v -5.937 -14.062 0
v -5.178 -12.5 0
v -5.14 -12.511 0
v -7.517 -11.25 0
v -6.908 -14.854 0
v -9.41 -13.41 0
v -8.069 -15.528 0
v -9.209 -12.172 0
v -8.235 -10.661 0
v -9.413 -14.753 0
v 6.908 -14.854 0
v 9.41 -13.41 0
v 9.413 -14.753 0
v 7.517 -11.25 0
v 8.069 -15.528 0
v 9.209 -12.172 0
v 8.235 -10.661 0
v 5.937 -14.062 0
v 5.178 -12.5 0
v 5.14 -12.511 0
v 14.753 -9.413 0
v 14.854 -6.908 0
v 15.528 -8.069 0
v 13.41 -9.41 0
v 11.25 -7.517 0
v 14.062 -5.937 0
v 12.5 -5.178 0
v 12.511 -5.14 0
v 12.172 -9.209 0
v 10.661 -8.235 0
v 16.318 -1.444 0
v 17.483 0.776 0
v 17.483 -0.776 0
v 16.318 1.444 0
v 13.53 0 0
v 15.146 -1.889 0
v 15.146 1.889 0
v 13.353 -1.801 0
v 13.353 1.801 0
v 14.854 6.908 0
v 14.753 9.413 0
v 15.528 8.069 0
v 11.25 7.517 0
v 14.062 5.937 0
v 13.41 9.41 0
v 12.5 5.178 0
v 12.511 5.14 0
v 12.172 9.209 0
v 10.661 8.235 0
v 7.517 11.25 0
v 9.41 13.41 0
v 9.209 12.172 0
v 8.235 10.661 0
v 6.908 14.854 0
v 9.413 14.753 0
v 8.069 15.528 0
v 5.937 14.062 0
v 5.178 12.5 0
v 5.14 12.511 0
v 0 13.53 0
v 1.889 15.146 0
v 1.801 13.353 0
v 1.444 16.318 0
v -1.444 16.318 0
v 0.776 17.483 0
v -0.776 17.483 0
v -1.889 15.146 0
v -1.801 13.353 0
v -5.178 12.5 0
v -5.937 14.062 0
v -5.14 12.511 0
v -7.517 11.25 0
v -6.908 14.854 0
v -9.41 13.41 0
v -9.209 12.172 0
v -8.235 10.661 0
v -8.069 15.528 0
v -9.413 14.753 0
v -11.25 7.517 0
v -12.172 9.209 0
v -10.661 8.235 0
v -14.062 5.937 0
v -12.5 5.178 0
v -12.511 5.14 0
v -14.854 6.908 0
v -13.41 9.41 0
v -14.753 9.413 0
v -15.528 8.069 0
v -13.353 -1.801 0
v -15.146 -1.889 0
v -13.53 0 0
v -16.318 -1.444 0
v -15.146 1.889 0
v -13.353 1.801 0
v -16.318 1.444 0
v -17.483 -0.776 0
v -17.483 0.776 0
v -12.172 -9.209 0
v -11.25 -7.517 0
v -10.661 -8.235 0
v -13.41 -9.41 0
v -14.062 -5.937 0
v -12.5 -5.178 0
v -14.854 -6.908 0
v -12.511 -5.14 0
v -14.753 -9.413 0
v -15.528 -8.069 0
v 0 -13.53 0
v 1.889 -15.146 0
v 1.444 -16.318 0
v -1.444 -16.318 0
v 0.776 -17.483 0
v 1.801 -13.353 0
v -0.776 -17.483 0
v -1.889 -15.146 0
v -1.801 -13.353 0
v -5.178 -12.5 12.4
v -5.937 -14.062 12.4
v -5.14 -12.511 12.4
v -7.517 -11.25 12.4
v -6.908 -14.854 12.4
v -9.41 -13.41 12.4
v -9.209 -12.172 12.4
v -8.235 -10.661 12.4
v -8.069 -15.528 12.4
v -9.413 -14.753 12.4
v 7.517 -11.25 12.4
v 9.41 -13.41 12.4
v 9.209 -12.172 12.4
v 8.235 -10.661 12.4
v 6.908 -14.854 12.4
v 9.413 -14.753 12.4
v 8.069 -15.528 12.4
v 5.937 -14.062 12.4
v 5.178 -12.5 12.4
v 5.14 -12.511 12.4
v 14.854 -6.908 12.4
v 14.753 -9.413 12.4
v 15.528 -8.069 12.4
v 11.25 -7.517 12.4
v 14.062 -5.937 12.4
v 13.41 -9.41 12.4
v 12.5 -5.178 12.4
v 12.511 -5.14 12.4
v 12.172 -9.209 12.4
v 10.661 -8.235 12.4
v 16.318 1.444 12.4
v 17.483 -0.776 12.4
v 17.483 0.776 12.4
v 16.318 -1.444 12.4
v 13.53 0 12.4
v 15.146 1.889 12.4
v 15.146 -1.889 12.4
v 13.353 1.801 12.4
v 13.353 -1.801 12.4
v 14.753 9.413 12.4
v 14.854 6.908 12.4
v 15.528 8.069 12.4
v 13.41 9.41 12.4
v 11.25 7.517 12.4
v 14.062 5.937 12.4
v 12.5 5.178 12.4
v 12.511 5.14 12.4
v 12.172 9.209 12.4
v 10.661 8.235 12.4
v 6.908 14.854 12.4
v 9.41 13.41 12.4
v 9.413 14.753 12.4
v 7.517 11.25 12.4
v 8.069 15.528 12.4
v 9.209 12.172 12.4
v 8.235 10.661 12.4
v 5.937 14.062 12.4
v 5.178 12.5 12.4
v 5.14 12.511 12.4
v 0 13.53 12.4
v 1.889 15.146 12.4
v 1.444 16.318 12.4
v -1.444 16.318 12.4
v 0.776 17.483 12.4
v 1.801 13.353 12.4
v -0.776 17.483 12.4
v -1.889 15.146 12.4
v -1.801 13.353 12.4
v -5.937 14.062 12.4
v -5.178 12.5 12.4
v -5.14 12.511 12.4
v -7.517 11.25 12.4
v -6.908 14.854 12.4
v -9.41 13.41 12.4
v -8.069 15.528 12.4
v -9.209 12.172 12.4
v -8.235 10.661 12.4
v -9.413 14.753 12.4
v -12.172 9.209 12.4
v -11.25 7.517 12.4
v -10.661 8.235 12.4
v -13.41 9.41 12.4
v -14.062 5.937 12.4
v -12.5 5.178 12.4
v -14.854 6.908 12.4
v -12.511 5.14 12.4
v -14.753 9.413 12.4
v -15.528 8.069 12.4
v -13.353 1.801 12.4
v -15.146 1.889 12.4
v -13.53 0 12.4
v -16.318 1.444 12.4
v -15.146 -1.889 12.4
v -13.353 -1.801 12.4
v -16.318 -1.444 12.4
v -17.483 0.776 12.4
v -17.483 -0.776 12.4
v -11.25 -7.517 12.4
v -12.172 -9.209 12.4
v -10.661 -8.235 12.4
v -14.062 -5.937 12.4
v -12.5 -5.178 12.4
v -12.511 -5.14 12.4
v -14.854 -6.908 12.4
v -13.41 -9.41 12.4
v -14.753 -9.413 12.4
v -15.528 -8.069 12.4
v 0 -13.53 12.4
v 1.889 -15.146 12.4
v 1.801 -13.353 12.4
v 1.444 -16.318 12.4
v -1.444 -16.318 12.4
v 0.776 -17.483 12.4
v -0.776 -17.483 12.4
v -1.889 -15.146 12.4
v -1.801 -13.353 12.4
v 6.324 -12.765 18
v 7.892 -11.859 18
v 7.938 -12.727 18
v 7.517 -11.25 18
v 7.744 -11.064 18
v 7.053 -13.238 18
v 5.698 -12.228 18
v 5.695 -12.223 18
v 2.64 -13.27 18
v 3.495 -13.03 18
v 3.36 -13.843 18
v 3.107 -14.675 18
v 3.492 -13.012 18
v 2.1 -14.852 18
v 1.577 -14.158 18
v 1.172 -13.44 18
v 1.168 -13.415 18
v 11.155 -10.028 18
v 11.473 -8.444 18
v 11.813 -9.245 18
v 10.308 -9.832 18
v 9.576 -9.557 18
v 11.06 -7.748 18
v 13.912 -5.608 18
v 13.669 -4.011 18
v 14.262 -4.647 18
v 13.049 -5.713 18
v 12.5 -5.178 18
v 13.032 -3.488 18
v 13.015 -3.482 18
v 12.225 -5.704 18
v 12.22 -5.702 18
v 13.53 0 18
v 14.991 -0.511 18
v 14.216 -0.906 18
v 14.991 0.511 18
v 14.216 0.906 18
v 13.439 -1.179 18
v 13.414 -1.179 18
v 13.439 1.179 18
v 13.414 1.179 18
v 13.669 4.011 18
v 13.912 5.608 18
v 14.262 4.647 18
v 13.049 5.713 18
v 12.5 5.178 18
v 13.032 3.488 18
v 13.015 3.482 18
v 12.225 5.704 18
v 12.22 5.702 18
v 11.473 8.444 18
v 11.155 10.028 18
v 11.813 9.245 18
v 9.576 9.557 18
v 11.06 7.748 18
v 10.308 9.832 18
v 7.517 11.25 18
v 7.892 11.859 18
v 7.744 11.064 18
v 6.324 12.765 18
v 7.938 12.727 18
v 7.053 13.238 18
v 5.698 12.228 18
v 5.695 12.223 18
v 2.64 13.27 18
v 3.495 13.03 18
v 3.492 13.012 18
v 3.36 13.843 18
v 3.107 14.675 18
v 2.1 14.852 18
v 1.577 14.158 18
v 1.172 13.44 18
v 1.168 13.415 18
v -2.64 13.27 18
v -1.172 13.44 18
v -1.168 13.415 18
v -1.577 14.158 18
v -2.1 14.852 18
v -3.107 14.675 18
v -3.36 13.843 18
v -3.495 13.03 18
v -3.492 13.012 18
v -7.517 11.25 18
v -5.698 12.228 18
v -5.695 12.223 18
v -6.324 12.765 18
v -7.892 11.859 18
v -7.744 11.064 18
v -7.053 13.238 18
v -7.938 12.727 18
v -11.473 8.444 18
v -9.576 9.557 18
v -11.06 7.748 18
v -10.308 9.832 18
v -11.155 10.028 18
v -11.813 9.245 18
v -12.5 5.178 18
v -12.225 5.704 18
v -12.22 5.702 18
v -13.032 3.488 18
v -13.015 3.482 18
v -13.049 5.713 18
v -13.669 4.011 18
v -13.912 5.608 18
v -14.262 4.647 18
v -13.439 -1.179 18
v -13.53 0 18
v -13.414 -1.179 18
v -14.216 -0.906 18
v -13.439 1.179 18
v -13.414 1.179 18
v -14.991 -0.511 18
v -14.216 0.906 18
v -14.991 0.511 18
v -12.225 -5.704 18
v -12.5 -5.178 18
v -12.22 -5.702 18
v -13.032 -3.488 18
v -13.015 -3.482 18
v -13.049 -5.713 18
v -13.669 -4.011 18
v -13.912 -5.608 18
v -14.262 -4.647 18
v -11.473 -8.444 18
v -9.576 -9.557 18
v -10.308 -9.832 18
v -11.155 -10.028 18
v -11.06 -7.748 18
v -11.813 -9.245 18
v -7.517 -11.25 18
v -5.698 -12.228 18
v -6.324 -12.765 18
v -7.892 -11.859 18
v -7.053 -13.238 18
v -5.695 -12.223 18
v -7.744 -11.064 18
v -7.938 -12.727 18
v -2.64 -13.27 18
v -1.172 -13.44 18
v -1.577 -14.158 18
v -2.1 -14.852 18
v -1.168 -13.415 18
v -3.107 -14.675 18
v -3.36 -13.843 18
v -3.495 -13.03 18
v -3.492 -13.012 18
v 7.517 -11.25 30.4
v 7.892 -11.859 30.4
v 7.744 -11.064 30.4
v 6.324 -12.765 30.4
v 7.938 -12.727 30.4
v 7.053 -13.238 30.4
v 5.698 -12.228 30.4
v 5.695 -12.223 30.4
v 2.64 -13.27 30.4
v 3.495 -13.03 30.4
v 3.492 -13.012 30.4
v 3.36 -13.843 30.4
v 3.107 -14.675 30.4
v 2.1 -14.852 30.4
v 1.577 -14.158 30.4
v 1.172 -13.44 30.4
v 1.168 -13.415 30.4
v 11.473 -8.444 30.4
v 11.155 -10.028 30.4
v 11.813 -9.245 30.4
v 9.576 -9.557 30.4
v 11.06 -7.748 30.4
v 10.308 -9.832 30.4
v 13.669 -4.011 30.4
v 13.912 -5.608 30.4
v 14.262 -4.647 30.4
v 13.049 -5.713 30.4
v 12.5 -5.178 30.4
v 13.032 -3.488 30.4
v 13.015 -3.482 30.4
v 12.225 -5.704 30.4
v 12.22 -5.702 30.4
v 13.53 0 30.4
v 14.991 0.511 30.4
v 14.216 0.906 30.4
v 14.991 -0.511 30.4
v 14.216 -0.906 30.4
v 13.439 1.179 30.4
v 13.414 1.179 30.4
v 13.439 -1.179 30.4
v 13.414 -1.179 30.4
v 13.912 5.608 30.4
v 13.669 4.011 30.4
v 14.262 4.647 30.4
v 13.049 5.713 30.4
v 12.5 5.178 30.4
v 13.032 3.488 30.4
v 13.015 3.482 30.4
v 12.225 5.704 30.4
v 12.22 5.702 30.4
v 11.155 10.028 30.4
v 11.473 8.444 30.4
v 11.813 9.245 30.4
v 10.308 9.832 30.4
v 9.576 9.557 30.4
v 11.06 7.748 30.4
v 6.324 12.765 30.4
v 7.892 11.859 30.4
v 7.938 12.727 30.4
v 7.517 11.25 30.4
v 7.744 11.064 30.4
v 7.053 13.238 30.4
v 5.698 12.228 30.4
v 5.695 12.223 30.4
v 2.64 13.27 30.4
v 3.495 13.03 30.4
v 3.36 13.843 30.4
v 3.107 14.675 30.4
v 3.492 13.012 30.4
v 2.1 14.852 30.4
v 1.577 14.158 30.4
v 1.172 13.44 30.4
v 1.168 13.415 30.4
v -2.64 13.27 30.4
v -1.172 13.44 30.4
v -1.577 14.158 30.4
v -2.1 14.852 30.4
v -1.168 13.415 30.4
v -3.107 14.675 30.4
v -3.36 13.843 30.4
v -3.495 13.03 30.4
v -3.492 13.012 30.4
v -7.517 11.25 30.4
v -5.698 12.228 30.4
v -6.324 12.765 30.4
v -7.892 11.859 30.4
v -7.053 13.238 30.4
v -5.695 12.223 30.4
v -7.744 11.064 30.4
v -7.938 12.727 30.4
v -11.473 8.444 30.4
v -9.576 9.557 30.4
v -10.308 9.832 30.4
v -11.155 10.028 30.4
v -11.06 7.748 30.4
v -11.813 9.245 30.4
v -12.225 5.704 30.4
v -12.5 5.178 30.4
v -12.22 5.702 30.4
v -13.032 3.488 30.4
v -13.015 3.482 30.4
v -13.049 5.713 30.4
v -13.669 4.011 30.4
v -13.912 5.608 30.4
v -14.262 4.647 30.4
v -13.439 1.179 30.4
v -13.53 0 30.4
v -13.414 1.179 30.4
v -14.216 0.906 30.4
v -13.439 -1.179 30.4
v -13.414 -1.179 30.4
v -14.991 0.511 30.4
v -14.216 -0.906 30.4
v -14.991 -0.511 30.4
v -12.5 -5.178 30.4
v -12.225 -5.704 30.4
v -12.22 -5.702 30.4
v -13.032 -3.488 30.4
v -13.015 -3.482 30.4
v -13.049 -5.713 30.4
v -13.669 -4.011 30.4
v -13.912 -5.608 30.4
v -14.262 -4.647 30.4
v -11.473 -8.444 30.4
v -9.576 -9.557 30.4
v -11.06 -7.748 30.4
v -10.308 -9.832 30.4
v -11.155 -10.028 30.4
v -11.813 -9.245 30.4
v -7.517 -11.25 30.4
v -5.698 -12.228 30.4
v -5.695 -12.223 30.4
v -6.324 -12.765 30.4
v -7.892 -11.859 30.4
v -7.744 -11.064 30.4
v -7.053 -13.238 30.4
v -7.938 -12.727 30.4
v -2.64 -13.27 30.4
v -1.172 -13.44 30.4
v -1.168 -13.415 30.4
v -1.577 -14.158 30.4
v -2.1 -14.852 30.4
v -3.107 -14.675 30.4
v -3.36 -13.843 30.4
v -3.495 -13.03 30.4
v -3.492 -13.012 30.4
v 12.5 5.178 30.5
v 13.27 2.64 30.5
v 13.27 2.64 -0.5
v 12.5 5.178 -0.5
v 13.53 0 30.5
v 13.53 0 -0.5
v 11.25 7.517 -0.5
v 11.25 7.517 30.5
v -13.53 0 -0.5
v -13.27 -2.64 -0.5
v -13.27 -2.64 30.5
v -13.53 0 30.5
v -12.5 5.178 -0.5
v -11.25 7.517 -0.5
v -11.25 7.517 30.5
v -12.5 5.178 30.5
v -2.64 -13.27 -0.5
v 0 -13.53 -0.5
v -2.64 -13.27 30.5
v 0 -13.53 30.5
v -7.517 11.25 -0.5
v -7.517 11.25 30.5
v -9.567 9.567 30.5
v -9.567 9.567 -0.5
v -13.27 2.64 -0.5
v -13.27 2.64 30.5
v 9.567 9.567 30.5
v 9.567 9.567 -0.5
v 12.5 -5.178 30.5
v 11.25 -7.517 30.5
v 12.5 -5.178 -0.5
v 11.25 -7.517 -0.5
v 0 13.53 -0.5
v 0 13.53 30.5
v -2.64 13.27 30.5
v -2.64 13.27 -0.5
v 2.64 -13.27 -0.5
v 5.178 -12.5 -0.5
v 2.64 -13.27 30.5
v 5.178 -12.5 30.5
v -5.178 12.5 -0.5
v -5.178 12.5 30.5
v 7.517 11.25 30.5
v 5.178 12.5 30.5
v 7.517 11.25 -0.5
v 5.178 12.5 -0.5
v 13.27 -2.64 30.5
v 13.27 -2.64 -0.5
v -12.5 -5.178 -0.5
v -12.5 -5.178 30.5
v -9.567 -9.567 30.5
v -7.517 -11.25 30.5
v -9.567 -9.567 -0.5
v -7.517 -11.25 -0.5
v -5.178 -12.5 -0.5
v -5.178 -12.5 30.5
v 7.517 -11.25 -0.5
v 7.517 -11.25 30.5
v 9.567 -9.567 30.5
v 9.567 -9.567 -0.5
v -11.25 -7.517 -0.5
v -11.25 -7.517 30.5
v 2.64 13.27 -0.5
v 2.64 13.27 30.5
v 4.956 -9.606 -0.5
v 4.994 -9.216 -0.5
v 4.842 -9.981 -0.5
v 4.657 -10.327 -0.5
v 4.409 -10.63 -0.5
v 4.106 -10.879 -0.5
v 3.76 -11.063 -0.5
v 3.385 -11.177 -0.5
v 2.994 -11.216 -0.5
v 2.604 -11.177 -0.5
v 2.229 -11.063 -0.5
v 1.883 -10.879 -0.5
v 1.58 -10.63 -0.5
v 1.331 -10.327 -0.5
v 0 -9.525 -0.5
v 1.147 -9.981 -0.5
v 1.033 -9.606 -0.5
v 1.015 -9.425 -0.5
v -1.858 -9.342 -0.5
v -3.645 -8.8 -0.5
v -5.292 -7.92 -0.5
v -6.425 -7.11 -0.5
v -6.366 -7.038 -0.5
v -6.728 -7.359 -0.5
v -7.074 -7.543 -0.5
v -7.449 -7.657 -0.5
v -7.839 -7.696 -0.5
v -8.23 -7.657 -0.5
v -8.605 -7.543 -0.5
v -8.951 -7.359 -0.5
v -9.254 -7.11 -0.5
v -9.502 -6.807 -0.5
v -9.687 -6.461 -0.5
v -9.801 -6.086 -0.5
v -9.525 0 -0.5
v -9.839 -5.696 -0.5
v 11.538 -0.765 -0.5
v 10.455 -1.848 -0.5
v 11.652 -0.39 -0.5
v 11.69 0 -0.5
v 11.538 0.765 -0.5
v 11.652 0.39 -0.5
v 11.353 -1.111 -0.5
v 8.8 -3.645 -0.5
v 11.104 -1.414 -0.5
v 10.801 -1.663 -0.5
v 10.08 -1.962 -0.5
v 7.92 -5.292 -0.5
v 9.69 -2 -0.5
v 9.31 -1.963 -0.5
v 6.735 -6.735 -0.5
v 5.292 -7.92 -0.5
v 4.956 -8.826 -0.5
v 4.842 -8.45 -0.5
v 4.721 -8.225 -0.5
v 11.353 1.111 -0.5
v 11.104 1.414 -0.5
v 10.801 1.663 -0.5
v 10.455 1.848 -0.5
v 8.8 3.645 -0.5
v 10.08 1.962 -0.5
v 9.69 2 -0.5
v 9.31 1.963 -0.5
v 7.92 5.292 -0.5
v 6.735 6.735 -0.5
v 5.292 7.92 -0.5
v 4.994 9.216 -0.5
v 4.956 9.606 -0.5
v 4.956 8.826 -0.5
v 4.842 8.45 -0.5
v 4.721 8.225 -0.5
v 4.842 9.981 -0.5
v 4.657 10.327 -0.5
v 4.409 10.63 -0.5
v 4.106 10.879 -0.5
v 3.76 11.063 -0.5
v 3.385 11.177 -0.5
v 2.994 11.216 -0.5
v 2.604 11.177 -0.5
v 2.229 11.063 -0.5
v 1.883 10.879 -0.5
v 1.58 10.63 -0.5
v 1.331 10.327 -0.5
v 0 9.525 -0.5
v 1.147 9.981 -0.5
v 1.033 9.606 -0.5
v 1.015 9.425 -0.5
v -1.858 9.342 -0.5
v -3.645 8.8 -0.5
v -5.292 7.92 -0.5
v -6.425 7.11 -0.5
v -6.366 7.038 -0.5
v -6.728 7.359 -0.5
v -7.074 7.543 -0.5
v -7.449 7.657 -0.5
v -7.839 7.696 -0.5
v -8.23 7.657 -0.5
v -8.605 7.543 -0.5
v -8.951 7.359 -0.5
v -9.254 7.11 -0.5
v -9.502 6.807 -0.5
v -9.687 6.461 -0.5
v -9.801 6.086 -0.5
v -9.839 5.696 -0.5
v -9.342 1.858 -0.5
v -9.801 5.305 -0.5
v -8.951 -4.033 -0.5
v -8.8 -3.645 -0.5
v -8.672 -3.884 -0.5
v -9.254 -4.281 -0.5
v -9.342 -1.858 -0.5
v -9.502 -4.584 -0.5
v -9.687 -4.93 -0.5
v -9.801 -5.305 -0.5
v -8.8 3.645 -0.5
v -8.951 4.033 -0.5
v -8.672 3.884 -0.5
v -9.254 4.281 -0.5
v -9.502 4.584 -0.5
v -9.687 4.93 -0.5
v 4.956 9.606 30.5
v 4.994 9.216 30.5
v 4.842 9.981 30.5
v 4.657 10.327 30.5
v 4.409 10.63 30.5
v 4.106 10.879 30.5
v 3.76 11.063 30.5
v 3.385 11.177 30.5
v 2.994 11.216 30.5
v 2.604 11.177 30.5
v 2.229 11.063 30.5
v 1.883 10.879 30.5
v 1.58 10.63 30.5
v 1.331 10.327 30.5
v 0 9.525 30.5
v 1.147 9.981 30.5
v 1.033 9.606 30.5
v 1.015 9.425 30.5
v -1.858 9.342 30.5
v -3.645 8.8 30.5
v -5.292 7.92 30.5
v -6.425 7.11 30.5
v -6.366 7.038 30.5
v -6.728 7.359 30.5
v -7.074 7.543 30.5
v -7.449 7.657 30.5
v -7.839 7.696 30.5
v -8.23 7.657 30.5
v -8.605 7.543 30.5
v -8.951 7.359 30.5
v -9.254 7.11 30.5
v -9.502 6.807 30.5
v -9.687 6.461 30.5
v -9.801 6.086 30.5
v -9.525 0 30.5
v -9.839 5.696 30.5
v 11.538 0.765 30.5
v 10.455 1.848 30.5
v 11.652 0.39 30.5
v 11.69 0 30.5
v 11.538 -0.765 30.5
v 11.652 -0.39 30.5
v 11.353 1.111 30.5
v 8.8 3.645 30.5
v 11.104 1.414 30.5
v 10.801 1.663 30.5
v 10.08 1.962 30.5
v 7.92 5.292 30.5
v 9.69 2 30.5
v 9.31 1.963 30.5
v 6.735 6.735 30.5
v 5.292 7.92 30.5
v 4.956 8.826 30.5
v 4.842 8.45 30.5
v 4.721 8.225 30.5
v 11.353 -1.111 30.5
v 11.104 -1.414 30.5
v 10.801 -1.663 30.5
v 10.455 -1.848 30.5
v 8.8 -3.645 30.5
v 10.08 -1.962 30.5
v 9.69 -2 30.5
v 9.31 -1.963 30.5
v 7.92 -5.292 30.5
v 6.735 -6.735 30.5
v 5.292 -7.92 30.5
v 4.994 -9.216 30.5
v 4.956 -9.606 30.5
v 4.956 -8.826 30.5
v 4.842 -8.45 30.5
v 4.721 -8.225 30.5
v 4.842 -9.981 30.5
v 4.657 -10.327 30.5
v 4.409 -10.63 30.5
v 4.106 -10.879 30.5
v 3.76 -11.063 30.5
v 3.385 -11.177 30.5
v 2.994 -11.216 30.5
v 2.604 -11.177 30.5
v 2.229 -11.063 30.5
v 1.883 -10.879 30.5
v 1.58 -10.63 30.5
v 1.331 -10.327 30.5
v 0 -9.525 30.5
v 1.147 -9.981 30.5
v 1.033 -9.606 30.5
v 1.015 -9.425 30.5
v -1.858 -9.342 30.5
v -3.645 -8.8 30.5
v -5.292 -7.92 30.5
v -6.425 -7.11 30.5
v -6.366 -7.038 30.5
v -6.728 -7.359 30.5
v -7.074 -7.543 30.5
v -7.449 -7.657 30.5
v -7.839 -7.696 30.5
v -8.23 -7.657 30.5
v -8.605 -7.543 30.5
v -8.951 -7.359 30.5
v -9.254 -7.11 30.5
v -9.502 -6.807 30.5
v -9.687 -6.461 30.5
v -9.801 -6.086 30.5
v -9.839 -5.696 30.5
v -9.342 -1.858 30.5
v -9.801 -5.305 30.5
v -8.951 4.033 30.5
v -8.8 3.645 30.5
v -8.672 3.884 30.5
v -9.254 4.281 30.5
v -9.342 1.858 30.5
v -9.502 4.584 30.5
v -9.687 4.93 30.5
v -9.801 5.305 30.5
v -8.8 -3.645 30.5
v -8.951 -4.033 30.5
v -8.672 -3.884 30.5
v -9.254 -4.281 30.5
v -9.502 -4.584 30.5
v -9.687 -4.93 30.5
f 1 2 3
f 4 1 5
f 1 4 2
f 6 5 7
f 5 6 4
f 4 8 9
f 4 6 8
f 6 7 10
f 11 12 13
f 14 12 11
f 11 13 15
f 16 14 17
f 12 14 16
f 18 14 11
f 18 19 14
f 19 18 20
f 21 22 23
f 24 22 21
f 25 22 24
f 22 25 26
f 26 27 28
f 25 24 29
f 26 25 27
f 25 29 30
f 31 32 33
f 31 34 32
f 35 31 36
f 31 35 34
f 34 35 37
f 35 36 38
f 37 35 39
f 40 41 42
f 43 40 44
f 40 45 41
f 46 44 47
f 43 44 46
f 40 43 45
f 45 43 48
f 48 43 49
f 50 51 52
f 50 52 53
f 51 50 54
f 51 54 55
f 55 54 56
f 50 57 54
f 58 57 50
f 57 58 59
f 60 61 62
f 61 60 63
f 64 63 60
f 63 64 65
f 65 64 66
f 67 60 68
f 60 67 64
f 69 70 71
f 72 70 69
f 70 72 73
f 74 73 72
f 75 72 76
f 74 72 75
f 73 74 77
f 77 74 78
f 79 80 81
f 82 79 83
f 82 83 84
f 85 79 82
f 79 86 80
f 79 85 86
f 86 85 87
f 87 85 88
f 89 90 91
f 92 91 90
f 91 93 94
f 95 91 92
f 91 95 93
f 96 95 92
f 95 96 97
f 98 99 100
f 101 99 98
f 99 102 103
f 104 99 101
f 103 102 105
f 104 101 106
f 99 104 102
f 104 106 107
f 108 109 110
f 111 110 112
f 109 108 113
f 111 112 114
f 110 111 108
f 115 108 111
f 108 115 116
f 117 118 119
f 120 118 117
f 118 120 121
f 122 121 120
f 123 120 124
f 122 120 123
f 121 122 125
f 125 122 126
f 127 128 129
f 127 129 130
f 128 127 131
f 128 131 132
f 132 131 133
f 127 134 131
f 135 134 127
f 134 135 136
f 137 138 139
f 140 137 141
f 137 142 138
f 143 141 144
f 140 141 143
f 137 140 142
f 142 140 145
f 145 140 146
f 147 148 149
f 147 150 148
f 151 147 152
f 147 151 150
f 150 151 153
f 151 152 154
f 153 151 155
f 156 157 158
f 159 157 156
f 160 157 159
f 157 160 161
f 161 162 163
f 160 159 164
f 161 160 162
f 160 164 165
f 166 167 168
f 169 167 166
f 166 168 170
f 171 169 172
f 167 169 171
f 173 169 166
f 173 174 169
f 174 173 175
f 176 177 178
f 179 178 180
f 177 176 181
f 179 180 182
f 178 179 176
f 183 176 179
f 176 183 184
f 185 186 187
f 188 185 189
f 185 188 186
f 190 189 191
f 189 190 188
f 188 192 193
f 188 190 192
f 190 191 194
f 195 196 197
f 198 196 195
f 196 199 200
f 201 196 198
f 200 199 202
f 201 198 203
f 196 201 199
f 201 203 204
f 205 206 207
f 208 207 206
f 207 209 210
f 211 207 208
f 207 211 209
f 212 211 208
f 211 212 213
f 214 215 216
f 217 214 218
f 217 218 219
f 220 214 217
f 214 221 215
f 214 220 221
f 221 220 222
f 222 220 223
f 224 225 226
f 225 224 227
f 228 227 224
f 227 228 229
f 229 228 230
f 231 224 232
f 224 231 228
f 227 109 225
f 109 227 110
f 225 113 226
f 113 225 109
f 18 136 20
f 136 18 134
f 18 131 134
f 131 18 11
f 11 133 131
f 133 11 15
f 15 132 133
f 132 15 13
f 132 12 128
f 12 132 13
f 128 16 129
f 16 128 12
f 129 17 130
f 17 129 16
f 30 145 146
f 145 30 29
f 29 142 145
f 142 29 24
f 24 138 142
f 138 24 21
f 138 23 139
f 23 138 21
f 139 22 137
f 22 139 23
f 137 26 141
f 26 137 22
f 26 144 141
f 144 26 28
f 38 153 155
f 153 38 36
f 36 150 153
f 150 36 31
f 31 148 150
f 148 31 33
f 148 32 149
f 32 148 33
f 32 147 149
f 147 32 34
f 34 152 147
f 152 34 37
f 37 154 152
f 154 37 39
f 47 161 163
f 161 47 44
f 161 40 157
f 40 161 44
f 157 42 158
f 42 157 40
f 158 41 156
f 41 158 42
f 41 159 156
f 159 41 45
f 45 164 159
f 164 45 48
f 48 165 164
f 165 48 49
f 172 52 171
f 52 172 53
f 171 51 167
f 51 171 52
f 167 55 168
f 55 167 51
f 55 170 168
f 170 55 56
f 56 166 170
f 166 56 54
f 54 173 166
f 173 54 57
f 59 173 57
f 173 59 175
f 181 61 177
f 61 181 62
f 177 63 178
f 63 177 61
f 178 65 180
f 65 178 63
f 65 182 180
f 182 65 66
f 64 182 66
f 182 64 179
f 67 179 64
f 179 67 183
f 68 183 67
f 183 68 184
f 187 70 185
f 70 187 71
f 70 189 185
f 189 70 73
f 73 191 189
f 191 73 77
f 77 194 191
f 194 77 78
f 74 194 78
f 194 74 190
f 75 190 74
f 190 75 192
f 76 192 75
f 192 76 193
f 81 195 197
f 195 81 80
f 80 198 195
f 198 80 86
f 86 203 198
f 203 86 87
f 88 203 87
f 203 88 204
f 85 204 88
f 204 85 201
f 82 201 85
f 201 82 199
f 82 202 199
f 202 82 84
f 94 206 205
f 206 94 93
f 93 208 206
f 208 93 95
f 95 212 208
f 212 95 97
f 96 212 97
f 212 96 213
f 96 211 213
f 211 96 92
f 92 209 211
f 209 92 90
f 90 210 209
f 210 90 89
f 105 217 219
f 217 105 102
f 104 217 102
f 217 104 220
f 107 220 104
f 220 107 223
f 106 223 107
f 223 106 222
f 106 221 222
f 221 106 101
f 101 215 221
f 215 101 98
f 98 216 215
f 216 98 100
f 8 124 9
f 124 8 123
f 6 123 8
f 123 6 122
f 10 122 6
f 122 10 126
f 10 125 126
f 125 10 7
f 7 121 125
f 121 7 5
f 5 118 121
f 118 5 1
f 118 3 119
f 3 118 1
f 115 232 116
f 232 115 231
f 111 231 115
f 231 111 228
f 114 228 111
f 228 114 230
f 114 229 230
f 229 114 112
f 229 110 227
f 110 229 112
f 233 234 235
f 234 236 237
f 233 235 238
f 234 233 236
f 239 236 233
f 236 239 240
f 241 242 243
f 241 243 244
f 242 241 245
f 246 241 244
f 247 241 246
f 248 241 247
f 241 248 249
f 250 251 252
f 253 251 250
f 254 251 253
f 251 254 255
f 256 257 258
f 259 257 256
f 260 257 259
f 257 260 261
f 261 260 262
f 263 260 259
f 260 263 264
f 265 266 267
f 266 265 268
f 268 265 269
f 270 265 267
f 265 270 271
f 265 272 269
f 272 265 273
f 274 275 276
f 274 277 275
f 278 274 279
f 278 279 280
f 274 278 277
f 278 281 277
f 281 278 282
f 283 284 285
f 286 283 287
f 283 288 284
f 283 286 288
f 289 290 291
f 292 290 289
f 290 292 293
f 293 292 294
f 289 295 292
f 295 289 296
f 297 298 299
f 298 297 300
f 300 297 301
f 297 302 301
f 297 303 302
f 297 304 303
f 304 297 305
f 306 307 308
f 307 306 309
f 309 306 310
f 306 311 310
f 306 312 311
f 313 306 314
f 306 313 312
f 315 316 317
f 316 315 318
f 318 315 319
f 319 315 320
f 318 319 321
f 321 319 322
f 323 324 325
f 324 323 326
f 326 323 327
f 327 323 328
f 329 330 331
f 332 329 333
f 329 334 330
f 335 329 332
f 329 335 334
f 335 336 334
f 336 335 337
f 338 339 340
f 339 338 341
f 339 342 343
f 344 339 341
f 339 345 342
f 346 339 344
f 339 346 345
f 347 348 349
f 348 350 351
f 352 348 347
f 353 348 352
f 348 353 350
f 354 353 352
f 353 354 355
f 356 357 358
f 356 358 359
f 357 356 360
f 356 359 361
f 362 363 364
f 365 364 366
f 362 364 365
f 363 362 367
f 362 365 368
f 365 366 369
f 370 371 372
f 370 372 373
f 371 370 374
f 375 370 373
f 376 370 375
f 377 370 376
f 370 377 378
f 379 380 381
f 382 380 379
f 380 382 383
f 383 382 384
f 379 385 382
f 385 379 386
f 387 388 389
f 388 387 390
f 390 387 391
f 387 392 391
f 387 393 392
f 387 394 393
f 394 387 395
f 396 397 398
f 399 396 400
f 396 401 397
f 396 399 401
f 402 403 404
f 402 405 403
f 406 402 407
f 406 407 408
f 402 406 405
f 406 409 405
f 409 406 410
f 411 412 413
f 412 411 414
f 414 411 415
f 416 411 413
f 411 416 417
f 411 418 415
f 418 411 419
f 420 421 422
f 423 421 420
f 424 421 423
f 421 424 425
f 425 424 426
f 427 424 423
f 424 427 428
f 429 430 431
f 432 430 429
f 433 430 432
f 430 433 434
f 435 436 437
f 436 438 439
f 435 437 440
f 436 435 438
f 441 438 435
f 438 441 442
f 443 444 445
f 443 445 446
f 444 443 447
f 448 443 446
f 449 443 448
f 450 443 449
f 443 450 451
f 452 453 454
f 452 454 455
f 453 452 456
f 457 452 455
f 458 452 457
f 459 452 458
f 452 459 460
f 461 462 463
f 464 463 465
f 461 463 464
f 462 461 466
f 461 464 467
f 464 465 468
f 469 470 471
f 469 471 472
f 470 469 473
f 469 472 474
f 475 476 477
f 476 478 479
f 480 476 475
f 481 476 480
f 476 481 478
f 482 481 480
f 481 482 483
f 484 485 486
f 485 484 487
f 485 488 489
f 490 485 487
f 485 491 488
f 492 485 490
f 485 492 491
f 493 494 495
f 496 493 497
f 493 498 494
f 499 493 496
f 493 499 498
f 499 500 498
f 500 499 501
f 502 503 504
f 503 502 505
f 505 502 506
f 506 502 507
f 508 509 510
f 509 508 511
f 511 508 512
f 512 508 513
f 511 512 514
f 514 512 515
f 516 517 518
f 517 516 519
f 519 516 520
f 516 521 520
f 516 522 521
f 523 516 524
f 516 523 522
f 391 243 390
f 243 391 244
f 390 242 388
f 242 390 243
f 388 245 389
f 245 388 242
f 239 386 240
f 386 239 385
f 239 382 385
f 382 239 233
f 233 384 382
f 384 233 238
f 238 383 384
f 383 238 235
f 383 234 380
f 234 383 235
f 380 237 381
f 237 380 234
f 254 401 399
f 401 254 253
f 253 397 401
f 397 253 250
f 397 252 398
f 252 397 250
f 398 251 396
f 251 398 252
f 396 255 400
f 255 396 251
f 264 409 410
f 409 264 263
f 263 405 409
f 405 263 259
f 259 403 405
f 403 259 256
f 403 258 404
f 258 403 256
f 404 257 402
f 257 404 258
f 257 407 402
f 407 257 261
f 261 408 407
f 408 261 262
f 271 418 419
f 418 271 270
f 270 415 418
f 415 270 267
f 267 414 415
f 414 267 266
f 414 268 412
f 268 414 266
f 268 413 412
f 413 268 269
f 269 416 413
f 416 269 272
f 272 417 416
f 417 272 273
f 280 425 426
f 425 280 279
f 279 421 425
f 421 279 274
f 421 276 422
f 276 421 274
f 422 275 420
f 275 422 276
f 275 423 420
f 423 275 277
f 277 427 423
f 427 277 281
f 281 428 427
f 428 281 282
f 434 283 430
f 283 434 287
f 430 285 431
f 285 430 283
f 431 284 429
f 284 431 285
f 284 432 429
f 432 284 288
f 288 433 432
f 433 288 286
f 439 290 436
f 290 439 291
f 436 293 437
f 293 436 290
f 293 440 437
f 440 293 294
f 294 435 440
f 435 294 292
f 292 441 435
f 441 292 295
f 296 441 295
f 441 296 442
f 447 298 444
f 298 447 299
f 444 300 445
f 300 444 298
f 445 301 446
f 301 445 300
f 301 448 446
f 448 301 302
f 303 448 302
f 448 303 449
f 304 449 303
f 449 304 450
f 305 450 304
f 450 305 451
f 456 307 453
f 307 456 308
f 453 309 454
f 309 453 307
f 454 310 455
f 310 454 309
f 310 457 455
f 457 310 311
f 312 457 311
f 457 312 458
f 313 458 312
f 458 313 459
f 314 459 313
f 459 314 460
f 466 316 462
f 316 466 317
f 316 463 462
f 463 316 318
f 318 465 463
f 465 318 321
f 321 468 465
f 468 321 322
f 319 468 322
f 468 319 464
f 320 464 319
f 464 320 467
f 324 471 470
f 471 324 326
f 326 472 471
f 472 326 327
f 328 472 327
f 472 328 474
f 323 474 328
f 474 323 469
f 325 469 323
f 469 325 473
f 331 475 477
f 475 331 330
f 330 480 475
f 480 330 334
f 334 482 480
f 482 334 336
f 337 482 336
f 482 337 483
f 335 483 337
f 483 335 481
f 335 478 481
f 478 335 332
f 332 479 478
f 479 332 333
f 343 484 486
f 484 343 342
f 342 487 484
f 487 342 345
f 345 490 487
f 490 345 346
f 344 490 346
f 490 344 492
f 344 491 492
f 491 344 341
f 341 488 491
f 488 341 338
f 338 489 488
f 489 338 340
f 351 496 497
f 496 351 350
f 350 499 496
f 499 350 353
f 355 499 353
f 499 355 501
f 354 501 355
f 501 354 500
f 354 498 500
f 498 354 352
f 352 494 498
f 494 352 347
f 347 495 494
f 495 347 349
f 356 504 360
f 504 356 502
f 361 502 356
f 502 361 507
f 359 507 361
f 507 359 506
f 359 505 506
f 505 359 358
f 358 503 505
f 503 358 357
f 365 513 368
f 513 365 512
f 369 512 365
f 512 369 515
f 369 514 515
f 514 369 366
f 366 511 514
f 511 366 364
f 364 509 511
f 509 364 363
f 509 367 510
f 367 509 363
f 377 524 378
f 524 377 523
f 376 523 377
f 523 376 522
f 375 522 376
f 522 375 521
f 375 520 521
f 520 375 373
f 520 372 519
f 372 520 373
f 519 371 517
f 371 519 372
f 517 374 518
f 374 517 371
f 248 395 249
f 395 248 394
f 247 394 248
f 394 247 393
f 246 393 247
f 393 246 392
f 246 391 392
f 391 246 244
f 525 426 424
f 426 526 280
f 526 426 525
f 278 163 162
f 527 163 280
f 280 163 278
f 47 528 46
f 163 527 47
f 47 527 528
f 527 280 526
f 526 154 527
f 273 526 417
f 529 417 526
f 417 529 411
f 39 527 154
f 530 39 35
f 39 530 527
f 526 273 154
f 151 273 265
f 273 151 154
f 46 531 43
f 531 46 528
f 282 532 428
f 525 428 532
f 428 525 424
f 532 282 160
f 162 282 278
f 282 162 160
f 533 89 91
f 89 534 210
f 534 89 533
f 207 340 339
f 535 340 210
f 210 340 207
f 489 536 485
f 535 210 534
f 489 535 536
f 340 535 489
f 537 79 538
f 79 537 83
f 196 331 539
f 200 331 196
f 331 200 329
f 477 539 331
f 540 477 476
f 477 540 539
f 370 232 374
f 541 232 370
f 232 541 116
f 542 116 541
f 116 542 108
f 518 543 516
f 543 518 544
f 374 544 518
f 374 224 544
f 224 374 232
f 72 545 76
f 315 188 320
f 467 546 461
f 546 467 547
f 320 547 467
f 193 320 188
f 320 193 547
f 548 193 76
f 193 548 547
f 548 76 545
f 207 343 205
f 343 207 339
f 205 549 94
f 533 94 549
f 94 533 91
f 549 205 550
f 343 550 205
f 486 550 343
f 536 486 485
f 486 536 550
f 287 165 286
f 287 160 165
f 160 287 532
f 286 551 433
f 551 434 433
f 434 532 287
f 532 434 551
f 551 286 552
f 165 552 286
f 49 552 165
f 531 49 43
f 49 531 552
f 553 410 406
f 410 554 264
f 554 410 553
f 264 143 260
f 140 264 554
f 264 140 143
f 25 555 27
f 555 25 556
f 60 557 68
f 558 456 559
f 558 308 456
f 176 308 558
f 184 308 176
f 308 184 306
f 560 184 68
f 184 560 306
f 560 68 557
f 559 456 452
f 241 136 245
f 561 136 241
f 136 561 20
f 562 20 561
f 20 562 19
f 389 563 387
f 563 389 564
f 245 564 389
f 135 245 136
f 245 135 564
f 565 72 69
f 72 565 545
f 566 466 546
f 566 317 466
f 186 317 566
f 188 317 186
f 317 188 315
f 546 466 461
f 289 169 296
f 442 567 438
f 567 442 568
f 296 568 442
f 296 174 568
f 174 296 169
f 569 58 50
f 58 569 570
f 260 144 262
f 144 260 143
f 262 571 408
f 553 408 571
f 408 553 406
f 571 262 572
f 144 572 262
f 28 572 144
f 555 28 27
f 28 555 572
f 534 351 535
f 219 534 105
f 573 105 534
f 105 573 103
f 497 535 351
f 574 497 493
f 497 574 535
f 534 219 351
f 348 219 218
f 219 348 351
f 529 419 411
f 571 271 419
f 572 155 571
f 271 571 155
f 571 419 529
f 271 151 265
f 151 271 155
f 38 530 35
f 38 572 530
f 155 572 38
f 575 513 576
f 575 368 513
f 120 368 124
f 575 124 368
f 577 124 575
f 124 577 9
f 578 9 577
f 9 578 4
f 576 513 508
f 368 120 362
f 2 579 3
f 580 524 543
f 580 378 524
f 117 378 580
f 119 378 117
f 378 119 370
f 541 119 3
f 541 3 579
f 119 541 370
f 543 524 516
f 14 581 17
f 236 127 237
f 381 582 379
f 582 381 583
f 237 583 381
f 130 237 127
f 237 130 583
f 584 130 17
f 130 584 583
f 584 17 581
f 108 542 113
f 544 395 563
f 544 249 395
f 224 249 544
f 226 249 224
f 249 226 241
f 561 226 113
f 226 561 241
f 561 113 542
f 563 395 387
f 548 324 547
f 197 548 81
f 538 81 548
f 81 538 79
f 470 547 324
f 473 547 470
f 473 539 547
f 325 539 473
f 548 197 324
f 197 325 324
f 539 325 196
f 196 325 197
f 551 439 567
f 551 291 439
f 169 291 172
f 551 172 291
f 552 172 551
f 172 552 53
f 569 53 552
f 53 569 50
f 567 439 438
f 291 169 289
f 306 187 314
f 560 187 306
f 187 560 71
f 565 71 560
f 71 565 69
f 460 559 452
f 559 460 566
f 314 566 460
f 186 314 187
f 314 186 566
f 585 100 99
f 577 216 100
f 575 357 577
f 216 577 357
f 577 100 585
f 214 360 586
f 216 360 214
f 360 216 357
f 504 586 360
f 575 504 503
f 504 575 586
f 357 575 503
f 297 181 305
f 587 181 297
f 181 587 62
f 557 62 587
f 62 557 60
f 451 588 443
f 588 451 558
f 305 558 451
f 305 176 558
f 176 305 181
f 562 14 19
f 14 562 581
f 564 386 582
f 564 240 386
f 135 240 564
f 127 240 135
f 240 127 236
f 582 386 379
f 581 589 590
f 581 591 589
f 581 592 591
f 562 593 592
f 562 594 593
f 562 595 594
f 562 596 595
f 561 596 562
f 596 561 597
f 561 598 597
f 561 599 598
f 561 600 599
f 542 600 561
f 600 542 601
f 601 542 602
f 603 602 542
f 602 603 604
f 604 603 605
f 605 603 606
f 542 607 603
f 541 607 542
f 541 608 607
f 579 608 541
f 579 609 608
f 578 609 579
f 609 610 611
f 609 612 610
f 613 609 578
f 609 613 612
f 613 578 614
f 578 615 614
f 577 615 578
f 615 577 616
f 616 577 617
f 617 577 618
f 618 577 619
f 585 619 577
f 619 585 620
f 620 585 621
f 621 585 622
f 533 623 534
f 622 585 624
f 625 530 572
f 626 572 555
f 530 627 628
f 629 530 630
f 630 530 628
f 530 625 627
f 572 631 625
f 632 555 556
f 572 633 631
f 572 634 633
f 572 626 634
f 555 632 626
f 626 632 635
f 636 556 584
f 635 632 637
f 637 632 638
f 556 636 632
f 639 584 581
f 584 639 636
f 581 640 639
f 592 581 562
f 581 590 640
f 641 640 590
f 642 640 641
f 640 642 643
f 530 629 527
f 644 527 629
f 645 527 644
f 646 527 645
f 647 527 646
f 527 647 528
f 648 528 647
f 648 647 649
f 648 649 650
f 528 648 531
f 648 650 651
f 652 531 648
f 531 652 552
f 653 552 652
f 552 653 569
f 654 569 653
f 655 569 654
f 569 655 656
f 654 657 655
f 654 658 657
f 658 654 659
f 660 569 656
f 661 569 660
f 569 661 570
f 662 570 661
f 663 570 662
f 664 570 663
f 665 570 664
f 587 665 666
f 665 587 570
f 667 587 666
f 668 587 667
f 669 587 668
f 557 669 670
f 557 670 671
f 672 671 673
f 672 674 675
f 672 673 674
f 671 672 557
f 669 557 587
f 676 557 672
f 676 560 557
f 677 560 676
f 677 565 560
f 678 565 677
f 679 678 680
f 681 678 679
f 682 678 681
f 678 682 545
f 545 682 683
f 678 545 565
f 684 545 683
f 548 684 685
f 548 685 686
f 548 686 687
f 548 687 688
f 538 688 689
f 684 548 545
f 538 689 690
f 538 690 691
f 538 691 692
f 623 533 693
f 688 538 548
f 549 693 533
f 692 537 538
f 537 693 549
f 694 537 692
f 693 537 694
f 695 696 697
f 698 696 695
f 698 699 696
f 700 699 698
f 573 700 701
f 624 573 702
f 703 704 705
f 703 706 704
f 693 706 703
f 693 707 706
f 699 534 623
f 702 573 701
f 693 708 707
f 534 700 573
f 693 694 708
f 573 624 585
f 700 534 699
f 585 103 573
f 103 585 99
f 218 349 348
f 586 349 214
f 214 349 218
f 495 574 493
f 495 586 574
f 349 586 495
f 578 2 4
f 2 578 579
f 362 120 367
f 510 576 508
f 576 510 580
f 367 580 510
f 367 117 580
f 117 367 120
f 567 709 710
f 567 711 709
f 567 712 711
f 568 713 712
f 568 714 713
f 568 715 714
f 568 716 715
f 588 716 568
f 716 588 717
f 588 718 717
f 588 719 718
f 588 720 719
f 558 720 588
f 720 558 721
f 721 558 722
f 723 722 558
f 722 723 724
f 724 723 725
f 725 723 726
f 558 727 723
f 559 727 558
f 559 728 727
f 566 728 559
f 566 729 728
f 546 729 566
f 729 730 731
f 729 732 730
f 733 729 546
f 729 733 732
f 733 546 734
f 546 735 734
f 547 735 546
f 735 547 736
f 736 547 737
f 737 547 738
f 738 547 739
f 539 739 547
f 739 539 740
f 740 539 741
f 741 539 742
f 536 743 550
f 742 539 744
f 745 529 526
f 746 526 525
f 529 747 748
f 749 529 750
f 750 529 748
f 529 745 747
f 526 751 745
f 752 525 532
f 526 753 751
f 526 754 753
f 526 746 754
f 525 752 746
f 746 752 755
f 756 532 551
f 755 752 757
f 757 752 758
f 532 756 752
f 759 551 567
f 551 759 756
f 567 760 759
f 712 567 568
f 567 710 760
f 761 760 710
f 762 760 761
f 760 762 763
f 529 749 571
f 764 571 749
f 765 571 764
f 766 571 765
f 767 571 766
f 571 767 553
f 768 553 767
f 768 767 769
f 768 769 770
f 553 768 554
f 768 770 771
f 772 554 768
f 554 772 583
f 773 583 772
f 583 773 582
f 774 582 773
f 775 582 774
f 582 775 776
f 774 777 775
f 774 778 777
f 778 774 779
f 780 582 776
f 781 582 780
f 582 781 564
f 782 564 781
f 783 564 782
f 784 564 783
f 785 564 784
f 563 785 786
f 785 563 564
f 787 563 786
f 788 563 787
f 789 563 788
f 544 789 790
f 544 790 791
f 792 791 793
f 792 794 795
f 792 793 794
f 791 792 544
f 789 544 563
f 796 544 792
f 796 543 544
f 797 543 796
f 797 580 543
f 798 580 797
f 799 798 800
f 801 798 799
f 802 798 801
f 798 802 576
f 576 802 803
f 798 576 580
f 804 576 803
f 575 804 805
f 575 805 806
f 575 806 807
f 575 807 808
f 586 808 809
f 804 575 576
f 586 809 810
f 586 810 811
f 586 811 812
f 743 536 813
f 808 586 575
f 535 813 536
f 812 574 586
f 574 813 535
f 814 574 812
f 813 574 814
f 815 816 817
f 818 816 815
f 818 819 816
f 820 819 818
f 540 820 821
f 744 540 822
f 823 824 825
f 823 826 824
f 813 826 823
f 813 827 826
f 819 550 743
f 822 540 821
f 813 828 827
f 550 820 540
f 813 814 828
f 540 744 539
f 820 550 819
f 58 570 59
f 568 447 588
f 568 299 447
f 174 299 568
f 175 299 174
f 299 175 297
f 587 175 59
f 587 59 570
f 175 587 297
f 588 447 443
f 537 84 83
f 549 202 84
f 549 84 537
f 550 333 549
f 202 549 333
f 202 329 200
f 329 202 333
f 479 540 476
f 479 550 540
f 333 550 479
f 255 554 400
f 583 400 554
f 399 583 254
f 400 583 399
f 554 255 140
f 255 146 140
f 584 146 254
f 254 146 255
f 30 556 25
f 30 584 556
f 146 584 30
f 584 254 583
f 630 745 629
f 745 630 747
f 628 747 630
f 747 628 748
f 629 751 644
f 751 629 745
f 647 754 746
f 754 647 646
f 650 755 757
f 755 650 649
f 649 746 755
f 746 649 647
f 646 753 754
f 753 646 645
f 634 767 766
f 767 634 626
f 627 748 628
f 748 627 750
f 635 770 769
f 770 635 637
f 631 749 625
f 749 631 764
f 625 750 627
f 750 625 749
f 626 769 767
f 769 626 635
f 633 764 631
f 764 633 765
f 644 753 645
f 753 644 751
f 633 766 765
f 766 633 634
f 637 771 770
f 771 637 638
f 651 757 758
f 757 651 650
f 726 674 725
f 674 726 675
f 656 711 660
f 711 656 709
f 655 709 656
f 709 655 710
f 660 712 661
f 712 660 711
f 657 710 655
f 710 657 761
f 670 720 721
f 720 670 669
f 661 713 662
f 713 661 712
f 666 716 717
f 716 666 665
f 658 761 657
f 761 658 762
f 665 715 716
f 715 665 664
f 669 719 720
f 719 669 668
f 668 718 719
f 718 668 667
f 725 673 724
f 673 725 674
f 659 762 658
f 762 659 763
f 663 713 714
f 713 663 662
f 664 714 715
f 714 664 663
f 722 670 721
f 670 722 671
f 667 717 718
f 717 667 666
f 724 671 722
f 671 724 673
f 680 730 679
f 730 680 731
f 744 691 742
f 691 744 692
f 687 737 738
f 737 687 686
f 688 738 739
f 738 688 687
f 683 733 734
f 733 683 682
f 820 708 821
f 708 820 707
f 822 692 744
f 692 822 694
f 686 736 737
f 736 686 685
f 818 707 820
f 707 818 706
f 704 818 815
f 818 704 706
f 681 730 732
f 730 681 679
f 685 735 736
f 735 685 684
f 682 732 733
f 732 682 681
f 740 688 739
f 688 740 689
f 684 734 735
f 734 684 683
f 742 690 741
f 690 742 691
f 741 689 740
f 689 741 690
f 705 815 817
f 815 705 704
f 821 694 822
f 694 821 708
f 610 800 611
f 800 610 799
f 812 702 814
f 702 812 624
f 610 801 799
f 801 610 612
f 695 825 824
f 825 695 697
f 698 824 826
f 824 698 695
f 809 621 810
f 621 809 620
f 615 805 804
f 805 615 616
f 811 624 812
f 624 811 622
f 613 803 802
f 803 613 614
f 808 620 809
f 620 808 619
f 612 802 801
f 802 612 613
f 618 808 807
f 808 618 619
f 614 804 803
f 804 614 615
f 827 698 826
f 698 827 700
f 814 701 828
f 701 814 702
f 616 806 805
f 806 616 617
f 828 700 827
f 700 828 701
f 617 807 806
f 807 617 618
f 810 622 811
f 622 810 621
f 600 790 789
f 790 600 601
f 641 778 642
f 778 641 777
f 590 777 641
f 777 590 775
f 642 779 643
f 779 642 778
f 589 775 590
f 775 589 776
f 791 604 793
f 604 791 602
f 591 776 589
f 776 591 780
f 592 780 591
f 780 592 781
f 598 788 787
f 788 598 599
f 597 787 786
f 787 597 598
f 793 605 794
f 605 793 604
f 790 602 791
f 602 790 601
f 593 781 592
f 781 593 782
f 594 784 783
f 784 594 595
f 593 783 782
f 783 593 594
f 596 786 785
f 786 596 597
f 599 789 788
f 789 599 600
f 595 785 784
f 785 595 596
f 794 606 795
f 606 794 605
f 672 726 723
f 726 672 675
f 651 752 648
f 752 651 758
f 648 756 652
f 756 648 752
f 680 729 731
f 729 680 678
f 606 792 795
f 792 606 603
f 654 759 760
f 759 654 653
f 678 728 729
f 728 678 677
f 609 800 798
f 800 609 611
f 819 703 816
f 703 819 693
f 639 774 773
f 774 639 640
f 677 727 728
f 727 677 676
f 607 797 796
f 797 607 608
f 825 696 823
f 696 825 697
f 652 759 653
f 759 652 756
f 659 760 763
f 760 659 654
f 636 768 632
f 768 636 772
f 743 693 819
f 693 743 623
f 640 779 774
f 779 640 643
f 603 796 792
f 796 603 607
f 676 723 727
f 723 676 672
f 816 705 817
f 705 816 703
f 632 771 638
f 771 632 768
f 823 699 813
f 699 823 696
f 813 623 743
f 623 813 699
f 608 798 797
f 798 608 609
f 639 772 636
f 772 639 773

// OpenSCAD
$fn = 32;

// ----------------------------------------------------------------------
// Two-module gear rim: z12 m2.5 and z18 m1.5, 30 mm wide
// ----------------------------------------------------------------------

// --- parameters (mm) ---
module_a = 2.5;           // first tooth module
teeth_a = 12;             // first band tooth count
module_b = 1.5;           // second tooth module
teeth_b = 18;             // second band tooth count
band_h = 12;              // height of one tooth band
web_t = 6;                // web thickness between the bands
total = 30;               // overall width over both bands
root_r = 11.88;           // root radius of the coarse band
hub_r = 13.53;            // hub radius
bore_d = 19.05;           // hub bore
hole_count = 5;           // lightening holes
hole_r = 9.69;            // lightening hole circle radius
hole_d = 4;               // lightening hole diameter

band_a = [[11.749, -1.723], [15.146, -1.889], [16.318, -1.444], [17.483, -0.776], [17.483, 0.776], [16.318, 1.444], [15.146, 1.889], [11.749, 1.723], [11.037, 4.383], [14.062, 5.937], [14.854, 6.908], [15.528, 8.069], [14.753, 9.413], [13.41, 9.41], [12.172, 9.209], [9.314, 7.367], [7.367, 9.314], [9.209, 12.172], [9.41, 13.41], [9.413, 14.753], [8.069, 15.528], [6.908, 14.854], [5.937, 14.062], [4.383, 11.037], [1.723, 11.749], [1.889, 15.146], [1.444, 16.318], [0.776, 17.483], [-0.776, 17.483], [-1.444, 16.318], [-1.889, 15.146], [-1.723, 11.749], [-4.383, 11.037], [-5.937, 14.062], [-6.908, 14.854], [-8.069, 15.528], [-9.413, 14.753], [-9.41, 13.41], [-9.209, 12.172], [-7.367, 9.314], [-9.314, 7.367], [-12.172, 9.209], [-13.41, 9.41], [-14.753, 9.413], [-15.528, 8.069], [-14.854, 6.908], [-14.062, 5.937], [-11.037, 4.383], [-11.749, 1.723], [-15.146, 1.889], [-16.318, 1.444], [-17.483, 0.776], [-17.483, -0.776], [-16.318, -1.444], [-15.146, -1.889], [-11.749, -1.723], [-11.037, -4.383], [-14.062, -5.937], [-14.854, -6.908], [-15.528, -8.069], [-14.753, -9.413], [-13.41, -9.41], [-12.172, -9.209], [-9.314, -7.367], [-7.367, -9.314], [-9.209, -12.172], [-9.41, -13.41], [-9.413, -14.753], [-8.069, -15.528], [-6.908, -14.854], [-5.937, -14.062], [-4.383, -11.037], [-1.723, -11.749], [-1.889, -15.146], [-1.444, -16.318], [-0.776, -17.483], [0.776, -17.483], [1.444, -16.318], [1.889, -15.146], [1.723, -11.749], [4.383, -11.037], [5.937, -14.062], [6.908, -14.854], [8.069, -15.528], [9.413, -14.753], [9.41, -13.41], [9.209, -12.172], [7.367, -9.314], [9.314, -7.367], [12.172, -9.209], [13.41, -9.41], [14.753, -9.413], [15.528, -8.069], [14.854, -6.908], [14.062, -5.937], [11.037, -4.383]];
band_b = [[11.565, -1.183], [13.439, -1.179], [14.216, -0.906], [14.991, -0.511], [14.991, 0.511], [14.216, 0.906], [13.439, 1.179], [11.565, 1.183], [11.272, 2.844], [13.032, 3.488], [13.669, 4.011], [14.262, 4.647], [13.912, 5.608], [13.049, 5.713], [12.225, 5.704], [10.463, 5.067], [9.619, 6.527], [11.053, 7.735], [11.473, 8.444], [11.813, 9.245], [11.155, 10.028], [10.308, 9.832], [9.537, 9.542], [8.099, 8.34], [6.807, 9.424], [7.741, 11.049], [7.892, 11.859], [7.938, 12.727], [7.053, 13.238], [6.324, 12.765], [5.698, 12.228], [4.758, 10.607], [3.173, 11.184], [3.495, 13.03], [3.36, 13.843], [3.107, 14.675], [2.1, 14.852], [1.577, 14.158], [1.172, 13.44], [0.843, 11.594], [-0.843, 11.594], [-1.172, 13.44], [-1.577, 14.158], [-2.1, 14.852], [-3.107, 14.675], [-3.36, 13.843], [-3.495, 13.03], [-3.173, 11.184], [-4.758, 10.607], [-5.698, 12.228], [-6.324, 12.765], [-7.053, 13.238], [-7.938, 12.727], [-7.892, 11.859], [-7.741, 11.049], [-6.807, 9.424], [-8.099, 8.34], [-9.537, 9.542], [-10.308, 9.832], [-11.155, 10.028], [-11.813, 9.245], [-11.473, 8.444], [-11.053, 7.735], [-9.619, 6.527], [-10.463, 5.067], [-12.225, 5.704], [-13.049, 5.713], [-13.912, 5.608], [-14.262, 4.647], [-13.669, 4.011], [-13.032, 3.488], [-11.272, 2.844], [-11.565, 1.183], [-13.439, 1.179], [-14.216, 0.906], [-14.991, 0.511], [-14.991, -0.511], [-14.216, -0.906], [-13.439, -1.179], [-11.565, -1.183], [-11.272, -2.844], [-13.032, -3.488], [-13.669, -4.011], [-14.262, -4.647], [-13.912, -5.608], [-13.049, -5.713], [-12.225, -5.704], [-10.463, -5.067], [-9.619, -6.527], [-11.053, -7.735], [-11.473, -8.444], [-11.813, -9.245], [-11.155, -10.028], [-10.308, -9.832], [-9.537, -9.542], [-8.099, -8.34], [-6.807, -9.424], [-7.741, -11.049], [-7.892, -11.859], [-7.938, -12.727], [-7.053, -13.238], [-6.324, -12.765], [-5.698, -12.228], [-4.758, -10.607], [-3.173, -11.184], [-3.495, -13.03], [-3.36, -13.843], [-3.107, -14.675], [-2.1, -14.852], [-1.577, -14.158], [-1.172, -13.44], [-0.843, -11.594], [0.843, -11.594], [1.172, -13.44], [1.577, -14.158], [2.1, -14.852], [3.107, -14.675], [3.36, -13.843], [3.495, -13.03], [3.173, -11.184], [4.758, -10.607], [5.698, -12.228], [6.324, -12.765], [7.053, -13.238], [7.938, -12.727], [7.892, -11.859], [7.741, -11.049], [6.807, -9.424], [8.099, -8.34], [9.537, -9.542], [10.308, -9.832], [11.155, -10.028], [11.813, -9.245], [11.473, -8.444], [11.053, -7.735], [9.619, -6.527], [10.463, -5.067], [12.225, -5.704], [13.049, -5.713], [13.912, -5.608], [14.262, -4.647], [13.669, -4.011], [13.032, -3.488], [11.272, -2.844]];

difference() {
  union() {
    /* tooth band A, overlapping the web by 0.4 mm */
    linear_extrude(height = band_h + 0.4) polygon(band_a);
    /* web */
    translate([0, 0, band_h - 0.4]) cylinder(h = web_t + 0.8, d = 2 * root_r);
    /* tooth band B */
    translate([0, 0, band_h + web_t]) linear_extrude(height = band_h + 0.4) polygon(band_b);
    /* hub */
    translate([0, 0, -0.5]) cylinder(h = total + 1.0, d = 2 * hub_r);
  }
  /* bore */
  translate([0, 0, -2.5]) cylinder(h = total + 5, d = bore_d);
  /* lightening holes through the web */
  for (i = [0 : hole_count - 1]) {
    a = i * 360 / hole_count;
    translate([hole_r * cos(a), hole_r * sin(a), -2.5]) cylinder(h = total + 5, d = hole_d);
  }
}
